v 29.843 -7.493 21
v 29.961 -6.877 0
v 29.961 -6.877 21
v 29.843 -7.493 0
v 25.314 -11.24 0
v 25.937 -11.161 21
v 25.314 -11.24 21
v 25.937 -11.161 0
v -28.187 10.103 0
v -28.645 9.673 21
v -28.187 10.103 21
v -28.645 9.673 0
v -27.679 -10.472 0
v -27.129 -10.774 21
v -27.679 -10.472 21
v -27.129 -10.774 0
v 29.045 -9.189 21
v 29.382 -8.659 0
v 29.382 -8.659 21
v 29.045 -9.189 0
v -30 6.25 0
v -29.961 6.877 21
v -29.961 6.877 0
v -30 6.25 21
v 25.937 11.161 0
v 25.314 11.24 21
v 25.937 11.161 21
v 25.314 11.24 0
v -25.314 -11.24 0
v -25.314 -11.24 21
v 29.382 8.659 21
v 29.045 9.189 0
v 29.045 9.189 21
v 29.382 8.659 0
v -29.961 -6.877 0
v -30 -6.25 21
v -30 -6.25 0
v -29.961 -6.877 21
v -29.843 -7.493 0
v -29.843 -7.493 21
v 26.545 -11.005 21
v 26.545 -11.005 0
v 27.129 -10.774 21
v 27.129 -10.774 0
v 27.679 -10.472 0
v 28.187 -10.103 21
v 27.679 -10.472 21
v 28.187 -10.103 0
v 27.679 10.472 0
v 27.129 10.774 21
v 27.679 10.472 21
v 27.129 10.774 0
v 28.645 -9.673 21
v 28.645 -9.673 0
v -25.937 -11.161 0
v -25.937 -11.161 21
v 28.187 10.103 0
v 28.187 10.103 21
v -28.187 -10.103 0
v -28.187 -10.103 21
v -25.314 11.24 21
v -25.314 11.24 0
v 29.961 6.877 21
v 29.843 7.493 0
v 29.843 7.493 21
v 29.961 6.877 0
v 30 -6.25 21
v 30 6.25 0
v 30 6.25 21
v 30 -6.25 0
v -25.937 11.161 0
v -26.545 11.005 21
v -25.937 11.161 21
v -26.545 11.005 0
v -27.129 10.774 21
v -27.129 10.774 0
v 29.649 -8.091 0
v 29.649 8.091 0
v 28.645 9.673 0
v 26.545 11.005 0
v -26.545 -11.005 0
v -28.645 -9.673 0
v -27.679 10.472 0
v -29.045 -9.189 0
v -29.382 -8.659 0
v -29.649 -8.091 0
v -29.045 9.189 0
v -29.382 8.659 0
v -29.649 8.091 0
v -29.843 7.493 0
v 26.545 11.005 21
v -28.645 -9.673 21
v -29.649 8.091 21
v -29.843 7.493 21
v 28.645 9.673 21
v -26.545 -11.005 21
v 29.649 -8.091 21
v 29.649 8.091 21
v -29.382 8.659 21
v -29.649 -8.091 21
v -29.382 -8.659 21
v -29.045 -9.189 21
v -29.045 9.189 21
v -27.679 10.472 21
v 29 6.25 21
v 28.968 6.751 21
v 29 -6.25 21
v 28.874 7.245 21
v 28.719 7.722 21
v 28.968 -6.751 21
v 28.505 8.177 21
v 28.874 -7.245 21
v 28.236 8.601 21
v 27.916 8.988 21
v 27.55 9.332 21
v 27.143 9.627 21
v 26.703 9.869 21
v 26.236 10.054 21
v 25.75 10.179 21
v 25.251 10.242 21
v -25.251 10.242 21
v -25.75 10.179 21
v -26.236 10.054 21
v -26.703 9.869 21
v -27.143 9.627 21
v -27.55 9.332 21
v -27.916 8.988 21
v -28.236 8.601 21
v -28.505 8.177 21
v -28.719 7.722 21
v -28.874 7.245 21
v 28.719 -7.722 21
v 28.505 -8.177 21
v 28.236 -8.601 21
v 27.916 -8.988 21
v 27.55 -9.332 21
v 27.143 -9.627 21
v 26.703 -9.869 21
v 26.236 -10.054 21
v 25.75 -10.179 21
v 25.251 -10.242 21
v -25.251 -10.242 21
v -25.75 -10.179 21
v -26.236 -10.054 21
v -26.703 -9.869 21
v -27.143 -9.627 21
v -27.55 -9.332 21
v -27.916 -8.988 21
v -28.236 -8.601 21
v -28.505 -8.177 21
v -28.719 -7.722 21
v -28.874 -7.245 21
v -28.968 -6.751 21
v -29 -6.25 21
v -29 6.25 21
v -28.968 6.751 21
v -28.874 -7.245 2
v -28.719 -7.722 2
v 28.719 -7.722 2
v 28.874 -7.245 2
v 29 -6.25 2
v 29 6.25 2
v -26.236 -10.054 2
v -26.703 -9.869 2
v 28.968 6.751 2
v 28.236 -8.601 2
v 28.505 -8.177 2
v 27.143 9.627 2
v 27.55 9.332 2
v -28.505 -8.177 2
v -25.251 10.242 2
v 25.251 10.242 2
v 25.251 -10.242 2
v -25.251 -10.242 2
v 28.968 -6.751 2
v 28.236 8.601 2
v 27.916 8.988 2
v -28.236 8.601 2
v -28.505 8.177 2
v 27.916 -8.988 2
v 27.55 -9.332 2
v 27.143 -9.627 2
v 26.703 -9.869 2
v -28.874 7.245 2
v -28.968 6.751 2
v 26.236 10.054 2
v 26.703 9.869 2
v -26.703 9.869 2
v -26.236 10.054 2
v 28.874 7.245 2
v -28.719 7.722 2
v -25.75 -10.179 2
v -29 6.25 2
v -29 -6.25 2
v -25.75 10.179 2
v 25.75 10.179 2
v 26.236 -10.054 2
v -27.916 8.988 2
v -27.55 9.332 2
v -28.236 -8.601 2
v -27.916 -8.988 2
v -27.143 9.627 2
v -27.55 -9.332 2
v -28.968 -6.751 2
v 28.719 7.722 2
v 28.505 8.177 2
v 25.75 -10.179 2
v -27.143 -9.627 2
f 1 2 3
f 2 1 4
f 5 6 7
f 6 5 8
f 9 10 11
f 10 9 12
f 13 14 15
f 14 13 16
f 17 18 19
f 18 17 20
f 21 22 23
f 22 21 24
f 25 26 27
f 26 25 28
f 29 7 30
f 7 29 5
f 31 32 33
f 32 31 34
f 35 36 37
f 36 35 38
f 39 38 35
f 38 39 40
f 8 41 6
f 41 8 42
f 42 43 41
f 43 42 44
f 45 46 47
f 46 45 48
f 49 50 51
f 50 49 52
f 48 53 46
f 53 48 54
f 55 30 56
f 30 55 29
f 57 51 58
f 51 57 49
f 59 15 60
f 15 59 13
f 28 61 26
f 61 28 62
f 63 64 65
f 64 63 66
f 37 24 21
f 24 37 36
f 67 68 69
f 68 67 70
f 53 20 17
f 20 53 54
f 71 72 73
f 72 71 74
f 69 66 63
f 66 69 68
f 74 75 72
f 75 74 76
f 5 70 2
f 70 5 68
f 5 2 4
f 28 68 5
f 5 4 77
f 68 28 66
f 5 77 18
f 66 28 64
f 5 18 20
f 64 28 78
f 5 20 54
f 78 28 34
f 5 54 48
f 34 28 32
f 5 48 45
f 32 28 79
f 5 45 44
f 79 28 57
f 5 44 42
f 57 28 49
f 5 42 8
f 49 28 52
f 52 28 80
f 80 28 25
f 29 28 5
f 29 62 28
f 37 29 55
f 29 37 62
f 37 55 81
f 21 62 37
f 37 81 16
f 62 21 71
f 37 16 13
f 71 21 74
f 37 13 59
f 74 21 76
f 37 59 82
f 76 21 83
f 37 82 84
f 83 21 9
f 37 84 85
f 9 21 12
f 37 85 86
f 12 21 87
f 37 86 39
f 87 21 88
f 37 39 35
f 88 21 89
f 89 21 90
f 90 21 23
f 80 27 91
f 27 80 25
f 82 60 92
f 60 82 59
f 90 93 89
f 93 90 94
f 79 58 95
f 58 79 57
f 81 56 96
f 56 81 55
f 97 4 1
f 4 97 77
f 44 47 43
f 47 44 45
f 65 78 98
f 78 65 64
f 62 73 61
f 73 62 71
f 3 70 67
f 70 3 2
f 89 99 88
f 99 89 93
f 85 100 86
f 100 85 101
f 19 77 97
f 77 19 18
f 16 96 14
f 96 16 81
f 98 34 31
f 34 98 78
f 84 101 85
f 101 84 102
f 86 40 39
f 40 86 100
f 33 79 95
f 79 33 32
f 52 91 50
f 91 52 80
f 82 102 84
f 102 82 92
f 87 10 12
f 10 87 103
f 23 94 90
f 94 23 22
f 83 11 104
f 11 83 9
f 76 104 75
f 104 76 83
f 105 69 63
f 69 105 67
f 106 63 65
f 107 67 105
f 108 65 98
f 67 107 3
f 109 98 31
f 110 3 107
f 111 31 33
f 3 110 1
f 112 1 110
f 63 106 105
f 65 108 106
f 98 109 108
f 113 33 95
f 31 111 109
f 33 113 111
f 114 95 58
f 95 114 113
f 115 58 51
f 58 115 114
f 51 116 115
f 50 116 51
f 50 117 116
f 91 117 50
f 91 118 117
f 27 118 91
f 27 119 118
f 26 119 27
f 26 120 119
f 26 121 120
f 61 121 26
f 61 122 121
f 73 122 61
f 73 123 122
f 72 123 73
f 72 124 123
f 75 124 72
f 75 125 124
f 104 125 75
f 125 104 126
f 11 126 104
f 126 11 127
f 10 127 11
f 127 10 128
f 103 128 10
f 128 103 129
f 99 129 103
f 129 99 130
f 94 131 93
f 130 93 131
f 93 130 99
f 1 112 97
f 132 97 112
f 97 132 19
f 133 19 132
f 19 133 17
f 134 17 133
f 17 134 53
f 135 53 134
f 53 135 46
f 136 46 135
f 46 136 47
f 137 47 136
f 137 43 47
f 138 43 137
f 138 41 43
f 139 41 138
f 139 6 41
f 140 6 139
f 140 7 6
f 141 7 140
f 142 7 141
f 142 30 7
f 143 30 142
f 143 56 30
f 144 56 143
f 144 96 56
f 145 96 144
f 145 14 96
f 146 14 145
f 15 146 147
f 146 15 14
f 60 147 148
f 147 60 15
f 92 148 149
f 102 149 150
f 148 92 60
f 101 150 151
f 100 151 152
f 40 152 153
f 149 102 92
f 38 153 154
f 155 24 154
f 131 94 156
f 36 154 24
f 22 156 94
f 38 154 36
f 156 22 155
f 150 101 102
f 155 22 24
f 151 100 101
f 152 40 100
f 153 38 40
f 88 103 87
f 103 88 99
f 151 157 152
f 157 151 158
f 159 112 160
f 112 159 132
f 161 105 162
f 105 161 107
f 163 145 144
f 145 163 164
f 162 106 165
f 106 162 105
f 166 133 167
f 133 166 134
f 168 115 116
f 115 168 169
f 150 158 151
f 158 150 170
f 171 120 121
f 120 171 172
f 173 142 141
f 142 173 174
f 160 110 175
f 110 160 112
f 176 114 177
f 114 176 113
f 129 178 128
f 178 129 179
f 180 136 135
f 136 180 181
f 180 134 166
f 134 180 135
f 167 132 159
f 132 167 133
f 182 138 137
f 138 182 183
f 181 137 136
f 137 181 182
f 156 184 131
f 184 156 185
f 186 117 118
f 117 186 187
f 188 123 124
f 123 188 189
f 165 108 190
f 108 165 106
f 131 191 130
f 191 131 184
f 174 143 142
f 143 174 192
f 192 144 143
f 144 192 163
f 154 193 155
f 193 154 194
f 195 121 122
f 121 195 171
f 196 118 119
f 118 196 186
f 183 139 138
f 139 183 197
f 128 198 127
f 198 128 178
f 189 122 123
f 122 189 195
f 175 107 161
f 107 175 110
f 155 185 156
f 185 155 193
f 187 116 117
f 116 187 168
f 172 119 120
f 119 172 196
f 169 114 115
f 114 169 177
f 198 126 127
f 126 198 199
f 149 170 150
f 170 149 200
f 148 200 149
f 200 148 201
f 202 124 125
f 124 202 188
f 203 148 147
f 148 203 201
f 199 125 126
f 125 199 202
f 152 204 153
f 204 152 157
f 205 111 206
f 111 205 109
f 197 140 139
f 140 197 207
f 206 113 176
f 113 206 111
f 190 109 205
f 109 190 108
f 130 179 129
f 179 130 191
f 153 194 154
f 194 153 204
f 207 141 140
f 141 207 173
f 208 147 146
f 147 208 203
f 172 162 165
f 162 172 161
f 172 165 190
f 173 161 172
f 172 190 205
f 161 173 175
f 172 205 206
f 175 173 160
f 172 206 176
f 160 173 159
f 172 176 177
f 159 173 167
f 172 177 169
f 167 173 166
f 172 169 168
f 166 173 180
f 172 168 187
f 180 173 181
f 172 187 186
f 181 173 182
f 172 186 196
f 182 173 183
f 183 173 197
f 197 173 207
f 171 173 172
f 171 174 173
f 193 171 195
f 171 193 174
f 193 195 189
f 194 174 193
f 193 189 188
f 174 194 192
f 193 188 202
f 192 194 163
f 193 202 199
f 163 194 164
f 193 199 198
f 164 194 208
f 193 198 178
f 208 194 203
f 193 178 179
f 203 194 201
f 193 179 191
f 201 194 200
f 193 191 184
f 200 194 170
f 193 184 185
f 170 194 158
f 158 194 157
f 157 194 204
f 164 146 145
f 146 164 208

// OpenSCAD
$fn = 50;


difference() {
	union() {
		hull() {
			translate(v = [-25.0000000000, 6.2500000000, 0]) {
				cylinder(h = 21, r = 5);
			}
			translate(v = [25.0000000000, 6.2500000000, 0]) {
				cylinder(h = 21, r = 5);
			}
			translate(v = [-25.0000000000, -6.2500000000, 0]) {
				cylinder(h = 21, r = 5);
			}
			translate(v = [25.0000000000, -6.2500000000, 0]) {
				cylinder(h = 21, r = 5);
			}
		}
	}
	union() {
		translate(v = [0, 0, 2]) {
			hull() {
				translate(v = [-25.0000000000, 6.2500000000, 0]) {
					cylinder(h = 19, r = 4);
				}
				translate(v = [25.0000000000, 6.2500000000, 0]) {
					cylinder(h = 19, r = 4);
				}
				translate(v = [-25.0000000000, -6.2500000000, 0]) {
					cylinder(h = 19, r = 4);
				}
				translate(v = [25.0000000000, -6.2500000000, 0]) {
					cylinder(h = 19, r = 4);
				}
			}
		}
	}
}
